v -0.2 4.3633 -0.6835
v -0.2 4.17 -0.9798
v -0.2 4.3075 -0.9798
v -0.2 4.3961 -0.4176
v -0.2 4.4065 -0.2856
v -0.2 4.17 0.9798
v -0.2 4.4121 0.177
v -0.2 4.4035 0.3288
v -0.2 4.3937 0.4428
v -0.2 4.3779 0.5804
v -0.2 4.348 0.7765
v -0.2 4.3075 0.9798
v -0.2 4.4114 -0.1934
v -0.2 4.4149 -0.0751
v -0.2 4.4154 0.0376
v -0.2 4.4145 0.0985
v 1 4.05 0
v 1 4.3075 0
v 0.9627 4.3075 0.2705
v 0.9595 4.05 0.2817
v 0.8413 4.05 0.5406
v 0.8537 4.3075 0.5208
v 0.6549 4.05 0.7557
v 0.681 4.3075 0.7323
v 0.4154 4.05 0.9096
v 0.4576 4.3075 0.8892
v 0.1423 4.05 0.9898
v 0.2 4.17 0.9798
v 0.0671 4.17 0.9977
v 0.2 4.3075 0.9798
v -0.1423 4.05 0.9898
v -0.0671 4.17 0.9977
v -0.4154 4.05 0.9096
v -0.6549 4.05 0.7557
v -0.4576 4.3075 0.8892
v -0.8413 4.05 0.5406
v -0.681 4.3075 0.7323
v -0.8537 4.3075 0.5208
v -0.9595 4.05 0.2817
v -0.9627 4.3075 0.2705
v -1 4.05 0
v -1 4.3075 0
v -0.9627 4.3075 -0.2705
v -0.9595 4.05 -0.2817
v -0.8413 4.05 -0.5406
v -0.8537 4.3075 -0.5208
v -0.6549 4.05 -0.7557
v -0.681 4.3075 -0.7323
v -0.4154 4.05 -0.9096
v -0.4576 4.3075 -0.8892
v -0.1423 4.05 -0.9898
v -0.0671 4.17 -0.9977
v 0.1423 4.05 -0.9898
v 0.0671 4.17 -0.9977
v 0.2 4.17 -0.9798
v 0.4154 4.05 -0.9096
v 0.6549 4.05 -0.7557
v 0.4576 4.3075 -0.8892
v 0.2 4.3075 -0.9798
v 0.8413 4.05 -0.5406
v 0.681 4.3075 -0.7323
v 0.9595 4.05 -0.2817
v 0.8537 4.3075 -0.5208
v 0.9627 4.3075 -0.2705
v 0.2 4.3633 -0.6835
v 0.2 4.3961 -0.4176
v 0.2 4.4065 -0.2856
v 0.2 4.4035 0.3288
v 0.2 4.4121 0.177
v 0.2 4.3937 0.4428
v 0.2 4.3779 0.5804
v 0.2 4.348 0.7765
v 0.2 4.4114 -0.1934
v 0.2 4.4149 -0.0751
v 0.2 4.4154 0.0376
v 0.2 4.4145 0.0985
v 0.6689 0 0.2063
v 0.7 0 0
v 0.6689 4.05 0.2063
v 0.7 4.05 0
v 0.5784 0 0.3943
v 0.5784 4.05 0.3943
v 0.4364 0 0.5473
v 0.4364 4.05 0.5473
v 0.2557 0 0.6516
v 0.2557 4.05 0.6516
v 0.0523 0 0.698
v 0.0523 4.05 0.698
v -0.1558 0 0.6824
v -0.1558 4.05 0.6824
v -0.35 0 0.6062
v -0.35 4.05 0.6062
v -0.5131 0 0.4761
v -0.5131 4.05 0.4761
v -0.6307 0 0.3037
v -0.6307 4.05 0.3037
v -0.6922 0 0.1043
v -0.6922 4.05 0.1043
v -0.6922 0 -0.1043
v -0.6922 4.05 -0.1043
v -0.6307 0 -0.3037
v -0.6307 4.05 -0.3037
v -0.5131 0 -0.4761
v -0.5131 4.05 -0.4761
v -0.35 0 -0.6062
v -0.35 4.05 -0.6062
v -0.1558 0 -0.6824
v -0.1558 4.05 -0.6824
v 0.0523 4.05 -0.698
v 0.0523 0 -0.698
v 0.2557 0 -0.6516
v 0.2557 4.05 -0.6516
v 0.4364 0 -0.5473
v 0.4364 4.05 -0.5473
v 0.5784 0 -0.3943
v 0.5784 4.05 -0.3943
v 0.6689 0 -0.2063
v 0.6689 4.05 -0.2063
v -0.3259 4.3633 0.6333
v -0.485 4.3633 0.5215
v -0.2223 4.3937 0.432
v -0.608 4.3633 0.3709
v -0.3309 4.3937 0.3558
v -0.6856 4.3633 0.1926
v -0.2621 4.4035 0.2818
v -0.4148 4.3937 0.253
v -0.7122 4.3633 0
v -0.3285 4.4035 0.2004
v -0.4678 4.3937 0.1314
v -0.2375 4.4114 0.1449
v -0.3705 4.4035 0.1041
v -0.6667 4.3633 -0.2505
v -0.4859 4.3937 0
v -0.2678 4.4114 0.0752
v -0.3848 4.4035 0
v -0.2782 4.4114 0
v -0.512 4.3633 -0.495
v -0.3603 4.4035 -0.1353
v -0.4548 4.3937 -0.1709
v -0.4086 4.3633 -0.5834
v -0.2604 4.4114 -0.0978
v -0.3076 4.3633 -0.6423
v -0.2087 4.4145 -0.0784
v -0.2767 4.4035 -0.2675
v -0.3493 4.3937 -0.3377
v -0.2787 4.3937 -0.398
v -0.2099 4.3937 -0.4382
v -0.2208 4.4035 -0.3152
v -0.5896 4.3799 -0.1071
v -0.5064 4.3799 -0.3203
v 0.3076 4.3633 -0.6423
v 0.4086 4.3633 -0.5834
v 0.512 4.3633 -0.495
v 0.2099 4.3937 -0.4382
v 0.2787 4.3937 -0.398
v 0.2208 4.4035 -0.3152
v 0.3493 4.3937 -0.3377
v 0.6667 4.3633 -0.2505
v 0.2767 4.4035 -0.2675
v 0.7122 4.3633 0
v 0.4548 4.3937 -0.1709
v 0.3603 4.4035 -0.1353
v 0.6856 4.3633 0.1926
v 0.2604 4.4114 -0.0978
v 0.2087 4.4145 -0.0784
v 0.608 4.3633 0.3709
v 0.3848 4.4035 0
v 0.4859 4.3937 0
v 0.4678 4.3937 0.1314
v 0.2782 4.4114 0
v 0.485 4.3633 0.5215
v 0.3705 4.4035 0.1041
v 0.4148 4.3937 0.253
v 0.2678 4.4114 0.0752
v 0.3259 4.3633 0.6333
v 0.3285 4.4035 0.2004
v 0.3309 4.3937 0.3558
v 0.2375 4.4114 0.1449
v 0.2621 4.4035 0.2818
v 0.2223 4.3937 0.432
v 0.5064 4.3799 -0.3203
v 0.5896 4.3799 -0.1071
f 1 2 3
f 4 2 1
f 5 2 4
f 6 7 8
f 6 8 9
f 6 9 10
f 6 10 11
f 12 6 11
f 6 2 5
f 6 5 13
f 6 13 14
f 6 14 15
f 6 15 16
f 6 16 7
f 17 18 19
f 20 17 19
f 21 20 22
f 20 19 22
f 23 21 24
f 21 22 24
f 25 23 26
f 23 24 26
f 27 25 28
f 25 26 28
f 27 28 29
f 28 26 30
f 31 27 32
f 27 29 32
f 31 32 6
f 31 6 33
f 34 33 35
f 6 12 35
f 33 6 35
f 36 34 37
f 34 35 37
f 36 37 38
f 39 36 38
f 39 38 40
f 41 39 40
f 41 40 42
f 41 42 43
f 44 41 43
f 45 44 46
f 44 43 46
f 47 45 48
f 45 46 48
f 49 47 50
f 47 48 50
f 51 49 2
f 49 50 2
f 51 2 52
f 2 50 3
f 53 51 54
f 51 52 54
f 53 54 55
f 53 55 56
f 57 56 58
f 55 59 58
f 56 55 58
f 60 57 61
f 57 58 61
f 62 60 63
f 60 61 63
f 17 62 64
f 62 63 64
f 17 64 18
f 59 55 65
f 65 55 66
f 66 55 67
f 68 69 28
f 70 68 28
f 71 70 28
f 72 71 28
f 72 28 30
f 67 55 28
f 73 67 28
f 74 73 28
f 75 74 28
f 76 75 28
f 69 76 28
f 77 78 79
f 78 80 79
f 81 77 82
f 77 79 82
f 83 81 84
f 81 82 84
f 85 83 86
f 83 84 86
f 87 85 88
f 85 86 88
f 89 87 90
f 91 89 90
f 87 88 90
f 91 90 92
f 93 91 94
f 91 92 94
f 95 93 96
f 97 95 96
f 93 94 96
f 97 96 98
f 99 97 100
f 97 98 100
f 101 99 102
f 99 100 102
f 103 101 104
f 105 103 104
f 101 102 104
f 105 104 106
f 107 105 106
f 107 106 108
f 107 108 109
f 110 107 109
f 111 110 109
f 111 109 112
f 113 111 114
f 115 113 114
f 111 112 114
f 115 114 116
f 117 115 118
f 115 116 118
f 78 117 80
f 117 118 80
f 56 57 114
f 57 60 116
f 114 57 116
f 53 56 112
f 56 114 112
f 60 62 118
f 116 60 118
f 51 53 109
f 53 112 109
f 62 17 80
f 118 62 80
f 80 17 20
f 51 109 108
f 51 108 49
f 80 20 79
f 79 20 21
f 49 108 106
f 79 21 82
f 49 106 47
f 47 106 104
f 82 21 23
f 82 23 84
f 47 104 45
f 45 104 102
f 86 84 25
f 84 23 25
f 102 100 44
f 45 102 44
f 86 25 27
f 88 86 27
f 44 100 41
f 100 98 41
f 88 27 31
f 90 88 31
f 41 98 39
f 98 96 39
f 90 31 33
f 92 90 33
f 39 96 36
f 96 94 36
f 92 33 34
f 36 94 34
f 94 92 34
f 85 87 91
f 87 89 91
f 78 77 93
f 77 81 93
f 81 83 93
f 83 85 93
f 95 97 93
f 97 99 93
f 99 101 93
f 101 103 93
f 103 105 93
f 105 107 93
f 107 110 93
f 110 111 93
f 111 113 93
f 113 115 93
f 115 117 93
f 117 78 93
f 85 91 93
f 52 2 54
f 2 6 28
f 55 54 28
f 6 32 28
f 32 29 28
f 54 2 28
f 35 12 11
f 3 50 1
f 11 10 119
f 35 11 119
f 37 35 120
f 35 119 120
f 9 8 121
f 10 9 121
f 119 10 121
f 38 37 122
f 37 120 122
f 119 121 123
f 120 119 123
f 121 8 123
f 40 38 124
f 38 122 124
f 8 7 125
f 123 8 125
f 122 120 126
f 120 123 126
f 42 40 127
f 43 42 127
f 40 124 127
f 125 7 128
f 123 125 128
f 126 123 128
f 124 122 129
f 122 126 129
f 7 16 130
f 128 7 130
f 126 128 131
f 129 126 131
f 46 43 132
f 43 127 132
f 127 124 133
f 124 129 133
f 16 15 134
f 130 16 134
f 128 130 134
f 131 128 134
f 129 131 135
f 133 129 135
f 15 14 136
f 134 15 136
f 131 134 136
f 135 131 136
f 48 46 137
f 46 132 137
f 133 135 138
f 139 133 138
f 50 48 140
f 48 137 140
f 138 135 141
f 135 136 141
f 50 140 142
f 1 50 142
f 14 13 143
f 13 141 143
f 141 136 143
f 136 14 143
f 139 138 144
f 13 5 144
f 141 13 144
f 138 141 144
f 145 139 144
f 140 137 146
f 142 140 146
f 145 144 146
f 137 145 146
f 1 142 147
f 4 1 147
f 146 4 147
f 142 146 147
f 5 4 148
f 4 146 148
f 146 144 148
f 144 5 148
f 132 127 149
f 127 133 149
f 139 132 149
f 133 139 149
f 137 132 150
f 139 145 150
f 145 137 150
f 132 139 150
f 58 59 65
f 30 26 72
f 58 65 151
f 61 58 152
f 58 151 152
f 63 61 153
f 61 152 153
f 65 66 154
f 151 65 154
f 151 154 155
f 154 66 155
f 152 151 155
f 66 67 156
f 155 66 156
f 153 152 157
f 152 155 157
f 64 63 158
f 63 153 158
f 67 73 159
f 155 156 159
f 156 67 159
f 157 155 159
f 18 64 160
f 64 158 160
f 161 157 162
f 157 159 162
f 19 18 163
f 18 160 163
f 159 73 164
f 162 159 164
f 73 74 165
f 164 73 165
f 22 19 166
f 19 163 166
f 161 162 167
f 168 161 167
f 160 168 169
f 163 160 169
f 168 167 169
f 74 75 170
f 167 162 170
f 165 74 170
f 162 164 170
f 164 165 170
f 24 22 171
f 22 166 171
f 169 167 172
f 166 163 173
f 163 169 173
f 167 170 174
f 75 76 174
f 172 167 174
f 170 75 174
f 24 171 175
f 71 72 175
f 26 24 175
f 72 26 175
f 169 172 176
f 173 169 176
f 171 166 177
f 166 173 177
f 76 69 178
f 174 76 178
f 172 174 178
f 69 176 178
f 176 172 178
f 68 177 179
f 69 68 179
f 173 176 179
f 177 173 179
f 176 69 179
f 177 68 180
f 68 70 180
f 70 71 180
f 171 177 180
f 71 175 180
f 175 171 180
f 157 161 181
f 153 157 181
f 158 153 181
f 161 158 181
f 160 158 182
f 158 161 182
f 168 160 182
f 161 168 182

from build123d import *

# Parameters (mm, degrees)
F0_W     = 0.2
F0_H     = 0.25
F2_DEPTH = 12.5


with BuildPart() as f1:
    # F0 (on Top) → F1 (revolve)
    with BuildSketch(Plane.XY):
        with BuildLine():
            Line((0, 4.17), (0, 0))
            Line((0, 0), (0.7, 0))
            Line((0.7, 0), (0.7, 4.05))
            Line((0.7, 4.05), (1, 4.05))
            Line((1, 4.05), (1, 4.307482))
            ThreePointArc((1, 4.307482), (0.602428, 4.379493), (0.2, 4.415553))
            Line((0.2, 4.415553), (0.2, 4.17))
            Line((0.2, 4.17), (0, 4.17))
        make_face()
    revolve(axis=Axis((0, 2.21, 0), (0, -1, 0)))

    # F0 (on Top) → F2 (cut, symmetric)
    with BuildSketch(Plane.XY):
        with BuildLine():
            Line((0, 4.42), (0, 4.17))
            Line((0, 4.17), (0.2, 4.17))
            Line((0.2, 4.17), (0.2, 4.415553))
            ThreePointArc((0.2, 4.415553), (0.100025, 4.418888), (0, 4.42))
        make_face()
        with Locations((-0.1, 4.295)):
            Rectangle(F0_W, F0_H)
    extrude(amount=F2_DEPTH, both=True, mode=Mode.SUBTRACT)


solid = f1.part
